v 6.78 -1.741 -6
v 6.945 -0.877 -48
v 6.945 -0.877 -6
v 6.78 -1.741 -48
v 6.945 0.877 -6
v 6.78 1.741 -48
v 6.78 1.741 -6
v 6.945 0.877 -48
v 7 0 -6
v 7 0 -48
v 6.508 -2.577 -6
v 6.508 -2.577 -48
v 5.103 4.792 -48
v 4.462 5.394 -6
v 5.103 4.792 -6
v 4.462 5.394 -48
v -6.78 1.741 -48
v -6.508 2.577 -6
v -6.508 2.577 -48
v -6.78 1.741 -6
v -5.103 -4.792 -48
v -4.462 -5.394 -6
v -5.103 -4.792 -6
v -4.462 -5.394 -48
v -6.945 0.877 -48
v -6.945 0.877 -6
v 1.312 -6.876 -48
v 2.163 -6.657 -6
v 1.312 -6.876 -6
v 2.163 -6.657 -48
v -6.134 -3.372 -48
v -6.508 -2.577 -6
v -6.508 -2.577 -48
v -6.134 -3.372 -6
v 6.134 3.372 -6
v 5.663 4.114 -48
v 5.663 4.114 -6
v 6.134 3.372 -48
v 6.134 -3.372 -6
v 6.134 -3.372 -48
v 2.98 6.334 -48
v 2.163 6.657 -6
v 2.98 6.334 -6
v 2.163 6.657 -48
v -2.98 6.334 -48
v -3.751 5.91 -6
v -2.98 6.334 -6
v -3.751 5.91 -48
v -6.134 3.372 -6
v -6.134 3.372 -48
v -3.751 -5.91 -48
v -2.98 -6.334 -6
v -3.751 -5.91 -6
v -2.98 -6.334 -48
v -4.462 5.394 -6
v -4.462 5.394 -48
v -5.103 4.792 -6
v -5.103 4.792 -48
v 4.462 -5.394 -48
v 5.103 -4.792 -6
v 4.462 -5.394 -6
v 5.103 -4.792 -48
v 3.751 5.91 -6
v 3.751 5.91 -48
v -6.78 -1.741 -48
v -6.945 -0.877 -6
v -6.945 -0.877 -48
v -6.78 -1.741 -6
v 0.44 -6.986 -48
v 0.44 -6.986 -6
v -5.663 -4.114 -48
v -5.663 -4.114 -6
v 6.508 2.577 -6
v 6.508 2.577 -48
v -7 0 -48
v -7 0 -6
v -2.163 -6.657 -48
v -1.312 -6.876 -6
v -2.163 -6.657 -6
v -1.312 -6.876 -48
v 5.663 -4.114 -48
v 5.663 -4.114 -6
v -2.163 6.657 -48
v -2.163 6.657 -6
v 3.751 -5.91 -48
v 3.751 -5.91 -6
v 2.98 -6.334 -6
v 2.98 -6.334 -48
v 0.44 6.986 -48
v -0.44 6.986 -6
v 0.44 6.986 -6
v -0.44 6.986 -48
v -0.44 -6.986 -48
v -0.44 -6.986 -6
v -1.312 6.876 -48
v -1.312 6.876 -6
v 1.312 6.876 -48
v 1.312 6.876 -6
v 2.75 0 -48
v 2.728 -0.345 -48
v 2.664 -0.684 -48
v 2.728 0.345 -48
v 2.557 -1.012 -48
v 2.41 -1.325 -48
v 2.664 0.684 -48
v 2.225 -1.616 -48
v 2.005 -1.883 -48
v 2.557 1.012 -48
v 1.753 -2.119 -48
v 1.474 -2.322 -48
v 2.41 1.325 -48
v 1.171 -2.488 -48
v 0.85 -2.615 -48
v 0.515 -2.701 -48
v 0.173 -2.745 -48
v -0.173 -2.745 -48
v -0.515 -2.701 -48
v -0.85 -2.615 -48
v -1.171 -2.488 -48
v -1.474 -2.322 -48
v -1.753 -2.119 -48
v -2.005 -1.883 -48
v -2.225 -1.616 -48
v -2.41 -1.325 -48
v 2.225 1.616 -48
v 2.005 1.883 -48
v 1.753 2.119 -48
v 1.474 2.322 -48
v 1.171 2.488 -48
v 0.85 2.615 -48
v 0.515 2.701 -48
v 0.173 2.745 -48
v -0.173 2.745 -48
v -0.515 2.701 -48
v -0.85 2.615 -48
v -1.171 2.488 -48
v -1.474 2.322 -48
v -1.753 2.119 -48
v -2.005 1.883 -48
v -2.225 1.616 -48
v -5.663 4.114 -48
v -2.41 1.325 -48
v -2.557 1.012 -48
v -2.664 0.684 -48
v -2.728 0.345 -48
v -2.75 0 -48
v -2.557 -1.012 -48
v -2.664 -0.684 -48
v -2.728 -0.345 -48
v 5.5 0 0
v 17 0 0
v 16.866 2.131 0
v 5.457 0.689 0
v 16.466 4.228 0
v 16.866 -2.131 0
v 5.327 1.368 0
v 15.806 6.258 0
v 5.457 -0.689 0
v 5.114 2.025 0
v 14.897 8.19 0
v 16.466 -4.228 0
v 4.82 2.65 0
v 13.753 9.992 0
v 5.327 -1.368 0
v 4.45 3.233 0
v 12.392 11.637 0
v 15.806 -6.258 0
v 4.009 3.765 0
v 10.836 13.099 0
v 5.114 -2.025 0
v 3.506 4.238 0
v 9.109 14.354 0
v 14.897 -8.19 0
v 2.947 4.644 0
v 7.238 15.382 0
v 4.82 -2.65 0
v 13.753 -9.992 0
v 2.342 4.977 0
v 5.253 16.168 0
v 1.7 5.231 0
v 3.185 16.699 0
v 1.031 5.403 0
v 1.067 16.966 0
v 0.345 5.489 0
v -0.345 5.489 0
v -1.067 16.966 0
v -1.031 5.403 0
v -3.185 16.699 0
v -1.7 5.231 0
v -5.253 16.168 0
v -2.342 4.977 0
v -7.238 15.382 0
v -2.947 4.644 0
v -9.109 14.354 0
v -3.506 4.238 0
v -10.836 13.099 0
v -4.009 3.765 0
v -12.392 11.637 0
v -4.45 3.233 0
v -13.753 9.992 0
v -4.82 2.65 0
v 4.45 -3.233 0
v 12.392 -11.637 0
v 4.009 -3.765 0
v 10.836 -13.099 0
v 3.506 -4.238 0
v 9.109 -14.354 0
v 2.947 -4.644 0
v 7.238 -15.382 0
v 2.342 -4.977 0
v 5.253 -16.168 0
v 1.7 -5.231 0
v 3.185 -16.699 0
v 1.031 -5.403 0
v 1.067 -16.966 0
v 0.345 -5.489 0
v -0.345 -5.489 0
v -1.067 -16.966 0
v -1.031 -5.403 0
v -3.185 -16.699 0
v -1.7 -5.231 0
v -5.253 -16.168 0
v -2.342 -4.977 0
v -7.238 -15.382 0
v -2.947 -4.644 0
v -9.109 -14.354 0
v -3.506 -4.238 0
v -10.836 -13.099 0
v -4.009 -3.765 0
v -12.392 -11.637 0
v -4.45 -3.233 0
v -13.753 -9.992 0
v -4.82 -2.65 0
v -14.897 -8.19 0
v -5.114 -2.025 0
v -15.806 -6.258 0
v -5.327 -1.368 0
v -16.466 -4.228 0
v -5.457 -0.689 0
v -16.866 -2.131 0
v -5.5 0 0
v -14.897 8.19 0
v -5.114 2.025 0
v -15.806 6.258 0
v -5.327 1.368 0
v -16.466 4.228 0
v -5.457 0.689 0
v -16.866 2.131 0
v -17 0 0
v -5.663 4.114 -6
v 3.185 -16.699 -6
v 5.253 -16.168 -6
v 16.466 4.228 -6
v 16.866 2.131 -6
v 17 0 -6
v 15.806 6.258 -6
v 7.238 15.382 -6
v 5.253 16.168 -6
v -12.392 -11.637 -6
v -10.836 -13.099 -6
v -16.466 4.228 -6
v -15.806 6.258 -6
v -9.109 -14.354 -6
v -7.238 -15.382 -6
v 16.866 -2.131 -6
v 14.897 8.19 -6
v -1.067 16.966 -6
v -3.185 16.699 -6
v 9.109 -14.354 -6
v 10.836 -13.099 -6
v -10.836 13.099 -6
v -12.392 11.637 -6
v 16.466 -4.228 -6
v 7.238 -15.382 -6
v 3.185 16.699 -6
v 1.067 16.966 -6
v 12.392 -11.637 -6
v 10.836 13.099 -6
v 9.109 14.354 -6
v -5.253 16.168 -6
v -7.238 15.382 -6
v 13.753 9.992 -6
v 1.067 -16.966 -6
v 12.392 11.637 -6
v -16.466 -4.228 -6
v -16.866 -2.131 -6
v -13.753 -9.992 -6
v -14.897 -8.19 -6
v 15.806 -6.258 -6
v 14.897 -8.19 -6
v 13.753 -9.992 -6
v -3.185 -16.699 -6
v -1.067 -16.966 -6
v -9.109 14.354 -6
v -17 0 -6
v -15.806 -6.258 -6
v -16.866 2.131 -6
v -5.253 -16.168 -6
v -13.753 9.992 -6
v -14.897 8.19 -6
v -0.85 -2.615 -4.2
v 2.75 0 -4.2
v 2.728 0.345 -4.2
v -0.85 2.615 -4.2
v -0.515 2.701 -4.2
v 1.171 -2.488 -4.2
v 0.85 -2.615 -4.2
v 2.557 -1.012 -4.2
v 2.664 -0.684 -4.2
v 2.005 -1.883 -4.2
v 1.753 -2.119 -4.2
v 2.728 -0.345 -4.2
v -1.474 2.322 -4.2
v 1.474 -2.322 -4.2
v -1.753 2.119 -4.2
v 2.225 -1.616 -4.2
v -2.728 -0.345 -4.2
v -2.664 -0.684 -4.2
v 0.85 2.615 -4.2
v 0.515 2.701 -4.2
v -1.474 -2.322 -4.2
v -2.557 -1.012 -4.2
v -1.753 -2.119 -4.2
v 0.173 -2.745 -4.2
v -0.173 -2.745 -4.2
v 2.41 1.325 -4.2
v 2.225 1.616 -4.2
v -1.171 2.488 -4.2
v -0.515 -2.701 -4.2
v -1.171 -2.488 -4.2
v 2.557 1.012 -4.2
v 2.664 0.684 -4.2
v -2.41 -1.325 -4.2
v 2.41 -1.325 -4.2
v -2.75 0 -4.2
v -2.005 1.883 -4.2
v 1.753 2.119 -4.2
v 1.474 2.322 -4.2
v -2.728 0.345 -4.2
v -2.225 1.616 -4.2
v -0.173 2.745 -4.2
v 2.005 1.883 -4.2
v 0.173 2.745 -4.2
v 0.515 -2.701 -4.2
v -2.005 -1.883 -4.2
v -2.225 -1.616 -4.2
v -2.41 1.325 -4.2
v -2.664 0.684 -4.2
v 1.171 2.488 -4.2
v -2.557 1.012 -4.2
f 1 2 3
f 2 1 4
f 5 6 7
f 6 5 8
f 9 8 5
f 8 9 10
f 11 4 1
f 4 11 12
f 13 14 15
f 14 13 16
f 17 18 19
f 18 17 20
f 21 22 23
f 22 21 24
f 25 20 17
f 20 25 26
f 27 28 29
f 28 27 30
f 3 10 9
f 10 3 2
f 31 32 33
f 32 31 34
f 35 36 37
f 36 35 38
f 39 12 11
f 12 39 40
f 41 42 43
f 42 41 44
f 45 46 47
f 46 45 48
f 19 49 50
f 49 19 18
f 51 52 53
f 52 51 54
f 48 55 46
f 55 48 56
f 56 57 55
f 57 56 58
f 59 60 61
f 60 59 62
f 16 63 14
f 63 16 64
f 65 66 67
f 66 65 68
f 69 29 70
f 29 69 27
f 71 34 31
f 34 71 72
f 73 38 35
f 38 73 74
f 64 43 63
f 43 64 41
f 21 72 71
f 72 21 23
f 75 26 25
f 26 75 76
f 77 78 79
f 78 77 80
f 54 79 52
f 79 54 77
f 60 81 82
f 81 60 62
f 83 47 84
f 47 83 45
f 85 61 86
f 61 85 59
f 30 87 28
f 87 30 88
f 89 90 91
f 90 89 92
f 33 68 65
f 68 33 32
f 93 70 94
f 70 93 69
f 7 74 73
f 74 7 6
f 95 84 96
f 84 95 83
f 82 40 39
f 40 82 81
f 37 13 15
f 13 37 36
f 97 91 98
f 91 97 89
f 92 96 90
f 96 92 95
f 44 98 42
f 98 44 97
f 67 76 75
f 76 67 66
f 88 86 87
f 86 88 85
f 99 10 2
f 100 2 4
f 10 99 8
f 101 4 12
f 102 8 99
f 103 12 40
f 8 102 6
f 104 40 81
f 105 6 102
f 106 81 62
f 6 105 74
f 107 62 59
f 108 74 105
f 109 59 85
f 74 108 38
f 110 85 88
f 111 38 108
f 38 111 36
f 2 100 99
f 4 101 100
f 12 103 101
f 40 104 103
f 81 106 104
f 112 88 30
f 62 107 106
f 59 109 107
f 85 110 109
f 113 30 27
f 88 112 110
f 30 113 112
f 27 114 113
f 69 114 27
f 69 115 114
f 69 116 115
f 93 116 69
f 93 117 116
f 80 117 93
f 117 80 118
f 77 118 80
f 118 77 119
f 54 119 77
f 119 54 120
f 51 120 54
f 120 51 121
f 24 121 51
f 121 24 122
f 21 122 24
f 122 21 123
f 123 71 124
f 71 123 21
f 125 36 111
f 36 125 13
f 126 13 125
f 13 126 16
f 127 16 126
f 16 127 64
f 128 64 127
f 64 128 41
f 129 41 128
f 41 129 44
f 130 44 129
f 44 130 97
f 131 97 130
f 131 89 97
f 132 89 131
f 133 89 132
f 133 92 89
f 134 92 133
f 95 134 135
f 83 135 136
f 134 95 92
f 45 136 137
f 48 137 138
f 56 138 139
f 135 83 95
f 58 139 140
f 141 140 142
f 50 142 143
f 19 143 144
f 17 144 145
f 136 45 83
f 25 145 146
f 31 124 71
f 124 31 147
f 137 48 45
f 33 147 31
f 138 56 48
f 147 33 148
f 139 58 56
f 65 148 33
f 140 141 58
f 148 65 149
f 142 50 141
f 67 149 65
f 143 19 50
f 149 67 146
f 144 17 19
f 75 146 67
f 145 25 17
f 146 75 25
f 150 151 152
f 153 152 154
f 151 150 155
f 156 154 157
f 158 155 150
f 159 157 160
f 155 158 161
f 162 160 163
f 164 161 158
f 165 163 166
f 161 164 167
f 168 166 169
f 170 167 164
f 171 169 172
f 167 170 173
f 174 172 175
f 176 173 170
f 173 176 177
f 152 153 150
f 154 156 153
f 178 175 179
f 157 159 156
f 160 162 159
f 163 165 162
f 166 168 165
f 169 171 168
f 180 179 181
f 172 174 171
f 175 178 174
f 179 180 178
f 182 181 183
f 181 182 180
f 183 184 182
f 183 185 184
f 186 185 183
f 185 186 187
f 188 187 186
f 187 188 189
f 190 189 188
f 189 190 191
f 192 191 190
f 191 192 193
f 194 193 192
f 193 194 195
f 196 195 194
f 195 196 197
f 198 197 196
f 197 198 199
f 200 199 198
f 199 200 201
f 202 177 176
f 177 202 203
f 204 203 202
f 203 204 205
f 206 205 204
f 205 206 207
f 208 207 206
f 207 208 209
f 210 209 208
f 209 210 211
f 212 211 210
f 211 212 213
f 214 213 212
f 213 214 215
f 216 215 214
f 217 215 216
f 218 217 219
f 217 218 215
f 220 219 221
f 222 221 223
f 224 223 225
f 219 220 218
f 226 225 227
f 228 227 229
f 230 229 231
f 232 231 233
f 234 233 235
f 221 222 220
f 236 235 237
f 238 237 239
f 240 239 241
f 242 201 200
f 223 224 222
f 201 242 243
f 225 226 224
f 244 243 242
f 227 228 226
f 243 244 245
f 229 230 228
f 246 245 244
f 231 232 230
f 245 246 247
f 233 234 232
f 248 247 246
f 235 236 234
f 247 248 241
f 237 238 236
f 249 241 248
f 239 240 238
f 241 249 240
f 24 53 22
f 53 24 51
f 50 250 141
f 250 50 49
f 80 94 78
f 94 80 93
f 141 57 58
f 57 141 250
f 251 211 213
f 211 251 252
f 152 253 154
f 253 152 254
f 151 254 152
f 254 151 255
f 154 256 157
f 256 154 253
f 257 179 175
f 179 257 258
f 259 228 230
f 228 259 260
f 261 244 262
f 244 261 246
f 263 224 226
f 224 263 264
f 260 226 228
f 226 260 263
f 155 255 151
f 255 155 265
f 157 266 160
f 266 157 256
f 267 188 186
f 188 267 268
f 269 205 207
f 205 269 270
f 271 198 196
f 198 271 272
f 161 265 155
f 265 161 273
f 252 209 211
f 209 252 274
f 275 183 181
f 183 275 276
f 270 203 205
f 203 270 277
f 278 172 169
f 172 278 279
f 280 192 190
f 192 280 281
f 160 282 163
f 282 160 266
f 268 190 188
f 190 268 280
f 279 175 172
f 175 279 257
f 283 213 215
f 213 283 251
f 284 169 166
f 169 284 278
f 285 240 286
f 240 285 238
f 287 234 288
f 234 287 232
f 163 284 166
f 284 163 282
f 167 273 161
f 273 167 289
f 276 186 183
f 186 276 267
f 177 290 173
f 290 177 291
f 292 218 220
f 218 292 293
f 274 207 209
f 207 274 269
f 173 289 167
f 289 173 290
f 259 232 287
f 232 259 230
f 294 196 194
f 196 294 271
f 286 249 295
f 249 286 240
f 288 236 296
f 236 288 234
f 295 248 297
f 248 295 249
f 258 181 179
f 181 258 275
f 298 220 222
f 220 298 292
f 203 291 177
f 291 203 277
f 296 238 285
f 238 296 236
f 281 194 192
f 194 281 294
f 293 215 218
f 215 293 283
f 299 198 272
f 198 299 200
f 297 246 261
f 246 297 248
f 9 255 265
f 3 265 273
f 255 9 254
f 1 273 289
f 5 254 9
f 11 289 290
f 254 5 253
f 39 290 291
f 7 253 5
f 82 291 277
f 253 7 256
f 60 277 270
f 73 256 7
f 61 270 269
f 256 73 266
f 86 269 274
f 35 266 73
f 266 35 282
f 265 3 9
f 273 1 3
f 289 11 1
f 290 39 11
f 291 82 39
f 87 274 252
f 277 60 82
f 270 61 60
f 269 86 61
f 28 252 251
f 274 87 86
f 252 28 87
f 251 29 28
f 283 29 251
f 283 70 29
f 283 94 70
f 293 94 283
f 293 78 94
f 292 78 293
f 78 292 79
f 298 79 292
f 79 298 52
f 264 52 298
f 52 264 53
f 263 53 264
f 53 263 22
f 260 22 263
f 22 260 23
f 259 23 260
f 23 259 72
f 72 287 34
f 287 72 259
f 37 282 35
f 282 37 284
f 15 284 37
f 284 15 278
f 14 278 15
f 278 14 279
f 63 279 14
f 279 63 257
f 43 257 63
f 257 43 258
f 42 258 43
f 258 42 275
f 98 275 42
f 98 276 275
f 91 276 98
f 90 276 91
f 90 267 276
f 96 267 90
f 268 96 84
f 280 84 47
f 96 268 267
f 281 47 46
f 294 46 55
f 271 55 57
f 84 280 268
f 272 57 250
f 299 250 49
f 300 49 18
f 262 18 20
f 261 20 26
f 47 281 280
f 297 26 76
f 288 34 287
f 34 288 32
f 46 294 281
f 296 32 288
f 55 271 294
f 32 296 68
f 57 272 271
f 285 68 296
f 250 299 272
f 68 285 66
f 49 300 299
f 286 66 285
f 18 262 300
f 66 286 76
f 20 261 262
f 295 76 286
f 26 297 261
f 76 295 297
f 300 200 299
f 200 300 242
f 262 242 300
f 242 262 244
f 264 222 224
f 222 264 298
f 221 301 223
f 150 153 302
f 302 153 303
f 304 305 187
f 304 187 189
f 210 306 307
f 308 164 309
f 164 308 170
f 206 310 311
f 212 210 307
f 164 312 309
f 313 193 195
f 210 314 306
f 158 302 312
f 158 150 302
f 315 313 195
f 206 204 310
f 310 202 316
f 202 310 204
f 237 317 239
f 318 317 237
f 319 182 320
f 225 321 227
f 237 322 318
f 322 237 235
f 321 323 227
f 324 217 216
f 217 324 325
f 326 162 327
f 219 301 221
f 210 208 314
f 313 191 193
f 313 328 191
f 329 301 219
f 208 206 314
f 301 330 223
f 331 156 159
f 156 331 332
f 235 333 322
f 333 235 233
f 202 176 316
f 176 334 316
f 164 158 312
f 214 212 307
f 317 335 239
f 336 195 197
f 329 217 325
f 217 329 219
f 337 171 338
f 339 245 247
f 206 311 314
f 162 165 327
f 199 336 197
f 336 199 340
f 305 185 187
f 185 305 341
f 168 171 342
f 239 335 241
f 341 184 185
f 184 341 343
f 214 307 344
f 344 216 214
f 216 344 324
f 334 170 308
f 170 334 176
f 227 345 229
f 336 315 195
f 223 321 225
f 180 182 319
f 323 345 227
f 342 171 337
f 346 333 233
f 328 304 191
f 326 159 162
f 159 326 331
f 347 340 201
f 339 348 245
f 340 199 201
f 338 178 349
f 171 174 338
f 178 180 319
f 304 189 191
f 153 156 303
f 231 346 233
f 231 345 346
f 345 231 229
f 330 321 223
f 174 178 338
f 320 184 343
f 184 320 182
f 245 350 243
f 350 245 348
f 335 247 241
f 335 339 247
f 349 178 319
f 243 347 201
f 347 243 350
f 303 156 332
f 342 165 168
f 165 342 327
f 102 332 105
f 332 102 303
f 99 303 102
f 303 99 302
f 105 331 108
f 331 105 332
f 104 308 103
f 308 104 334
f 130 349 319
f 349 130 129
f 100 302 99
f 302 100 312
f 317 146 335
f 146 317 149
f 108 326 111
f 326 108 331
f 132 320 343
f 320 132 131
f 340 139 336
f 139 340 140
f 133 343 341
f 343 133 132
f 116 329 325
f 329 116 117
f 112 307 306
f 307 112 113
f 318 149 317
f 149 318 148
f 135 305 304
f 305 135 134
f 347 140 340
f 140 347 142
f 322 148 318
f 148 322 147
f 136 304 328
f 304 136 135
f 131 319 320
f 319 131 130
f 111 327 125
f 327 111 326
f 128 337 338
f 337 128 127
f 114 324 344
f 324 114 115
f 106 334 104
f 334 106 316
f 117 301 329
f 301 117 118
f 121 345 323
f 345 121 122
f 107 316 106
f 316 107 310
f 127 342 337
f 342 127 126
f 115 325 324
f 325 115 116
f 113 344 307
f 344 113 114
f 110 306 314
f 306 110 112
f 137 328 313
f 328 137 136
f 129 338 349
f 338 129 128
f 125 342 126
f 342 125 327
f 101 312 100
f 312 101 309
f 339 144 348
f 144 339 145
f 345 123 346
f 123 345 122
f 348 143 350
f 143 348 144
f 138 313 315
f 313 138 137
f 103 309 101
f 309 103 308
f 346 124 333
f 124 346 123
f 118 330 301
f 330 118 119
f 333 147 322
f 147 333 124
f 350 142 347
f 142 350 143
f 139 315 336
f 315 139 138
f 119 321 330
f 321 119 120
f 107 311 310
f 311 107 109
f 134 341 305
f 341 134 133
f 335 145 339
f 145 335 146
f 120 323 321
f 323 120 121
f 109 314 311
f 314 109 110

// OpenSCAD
$fn = 50;


difference() {
	union() {
		translate(v = [0, 0, -48.0000000000]) {
			cylinder(h = 48, r = 7.0000000000);
		}
		translate(v = [0, 0, -6.0000000000]) {
			cylinder(h = 6, r = 17.0000000000);
		}
	}
	union() {
		translate(v = [0, 0, 0]) {
			rotate(a = [0, 0, 0]) {
				difference() {
					union() {
						#translate(v = [0, 0, -48.0000000000]) {
							cylinder(h = 48, r = 2.2500000000);
						}
						#translate(v = [0, 0, -4.2000000000]) {
							cylinder(h = 4.2000000000, r = 7.0000000000, r1 = 2.7500000000, r2 = 5.5000000000);
						}
						#translate(v = [0, 0, -48.0000000000]) {
							cylinder(h = 48, r = 2.7500000000);
						}
						#translate(v = [0, 0, -48.0000000000]) {
							cylinder(h = 48, r = 2.2500000000);
						}
					}
					union();
				}
			}
		}
	}
}
